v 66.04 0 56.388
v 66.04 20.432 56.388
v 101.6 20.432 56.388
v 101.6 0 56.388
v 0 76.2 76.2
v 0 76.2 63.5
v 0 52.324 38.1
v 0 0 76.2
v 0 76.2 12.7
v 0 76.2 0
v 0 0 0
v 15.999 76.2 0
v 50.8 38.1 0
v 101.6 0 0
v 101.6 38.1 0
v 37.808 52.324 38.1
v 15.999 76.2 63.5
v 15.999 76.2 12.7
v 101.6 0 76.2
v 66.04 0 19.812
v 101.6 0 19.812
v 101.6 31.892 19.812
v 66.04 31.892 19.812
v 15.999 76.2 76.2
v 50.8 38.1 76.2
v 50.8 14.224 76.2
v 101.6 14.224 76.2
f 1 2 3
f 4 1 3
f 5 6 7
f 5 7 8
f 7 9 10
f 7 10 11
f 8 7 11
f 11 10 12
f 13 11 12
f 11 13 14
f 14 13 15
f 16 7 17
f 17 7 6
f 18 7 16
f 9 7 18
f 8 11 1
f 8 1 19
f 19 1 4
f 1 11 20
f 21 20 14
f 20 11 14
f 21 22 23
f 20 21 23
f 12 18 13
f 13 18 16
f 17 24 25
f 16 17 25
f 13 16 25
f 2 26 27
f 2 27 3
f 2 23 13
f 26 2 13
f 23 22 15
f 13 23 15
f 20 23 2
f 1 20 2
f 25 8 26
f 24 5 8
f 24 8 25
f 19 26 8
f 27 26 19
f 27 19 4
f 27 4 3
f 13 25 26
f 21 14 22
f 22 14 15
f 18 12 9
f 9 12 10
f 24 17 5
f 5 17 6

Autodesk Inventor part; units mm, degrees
ref_plane "YZ Plane" through (0, 0, 0) normal (1, 0, 0) x (0, 1, 0)
ref_plane "XZ Plane" through (0, 0, 0) normal (0, 1, 0) x (-1, 0, 0)
ref_plane "XY Plane" through (0, 0, 0) normal (0, 0, 1) x (1, 0, 0)
sketch "Sketch1" plane through (0, 0, 0) normal (0, 0, 1) x (1, 0, 0)
  line L0 (0, 0) -> (101.6, 0)
  line L1 (101.6, 0) -> (101.6, 76.2)
  line L2 (101.6, 76.2) -> (0, 76.2)
  line L3 (0, 76.2) -> (0, 0)
  dimension "d0" = 101.6
  dimension "d1" = 76.2
extrude "Extrusion1" add sketch "Sketch1" along normal blind 76.2
sketch "Sketch2" plane through (0, 76.2, 0) normal (0, 1, 0) x (1, 0, 0)
  line L0 (101.6, 0) -> (101.6, -76.2) projected
  line L1 (101.6, -19.812) -> (66.04, -19.812)
  line L2 (66.04, -19.812) -> (66.04, -56.388)
  line L3 (66.04, -56.388) -> (101.6, -56.388)
  line L4 (101.6, -56.388) -> (101.6, -19.812)
  point P0 (0, 0)
  dimension "d4" = 35.56
  dimension "d5" = 36.576
  dimension "d6" = 19.812
extrude "Extrusion2" cut sketch "Sketch2" against normal blind 76.2
sketch "Sketch3" plane through (0, 0, 76.2) normal (0, 0, 1) x (1, 0, 0)
  line L0 (0, 75.8832) -> (15.9989, 76.2)
  line L1 (101.6, 76.2) -> (0, 76.2) projected
  line L2 (66.04, 0) -> (101.6, 0) projected
  line L3 (101.6, 0) -> (50.8, 0)
  line L4 (101.6, 0) -> (101.6, 38.1)
  line L5 (101.6, 76.2) -> (101.6, 0) projected
  line L6 (50.8, 0) -> (50.8, 38.1)
  line L7 (15.9989, 76.2) -> (50.8, 38.1)
  line L8 (101.6, 38.1) -> (101.6, 90.7152)
  line L9 (101.6, 90.7152) -> (15.9989, 90.7152)
  line L10 (15.9989, 90.7152) -> (15.9989, 76.2)
  line L11 (50.8, 38.1) -> (101.6, 38.1)
  point P0 (0, 0)
  dimension "d9" = 16.002
  dimension "d10" = 50.8
  dimension "d11" = 38.1
extrude "Extrusion3" cut sketch "Sketch3" against normal blind 76.2 contours L5 L11 L7 L1
sketch "Sketch4" plane through (101.6, 0, 76.2) normal (1, 0, 0) x (0, 0, -1)
  line L0 (76.2, 38.1) -> (56.388, 38.1) projected
  line L1 (0, 0) -> (0, 38.1) projected
  line L2 (76.2, 38.1) -> (0, 38.1)
  line L3 (0, 38.1) -> (0, 14.224)
  line L4 (0, 14.224) -> (76.2, 38.1)
  point P0 (76.2, 0)
  dimension "d14" = 23.876
extrude "Extrusion4" cut sketch "Sketch4" against normal blind 50.8
sketch "Sketch5" plane through (0, 0, 0) normal (-1, 0, 0) x (0, 0, 1)
  point P0 (0, 0)
sketch "Sketch6" plane through (0, 0, 0) normal (-1, 0, 0) x (0, 0, 1)
  point P0 (0, 0)
sketch "Sketch7" plane through (0, 0, 0) normal (-1, 0, 0) x (0, 0, 1)
  line L0 (76.2, 76.2) -> (0, 76.2) projected
  line L1 (63.5, 76.2) -> (38.1, 76.2)
  line L2 (38.1, 76.2) -> (38.1, 52.324)
  line L3 (38.1, 52.324) -> (63.5, 76.2)
  line L4 (12.7, 76.2) -> (38.1, 76.2)
  line L5 (38.1, 52.324) -> (12.7, 76.2)
  line L6 (12.7, 76.2) -> (63.5, 76.2)
  point P0 (0, 0)
  dimension "d17" = 25.4
  dimension "d18" = 23.876
  dimension "d19" = 12.7
sketch "Sketch8" plane through (0, 0, 0) normal (-1, 0, 0) x (0, 0, 1)
  point P0 (0, 0)
extrude "Extrusion5" cut sketch "Sketch7" against normal blind 50.8
properties part number "orthographic2"
